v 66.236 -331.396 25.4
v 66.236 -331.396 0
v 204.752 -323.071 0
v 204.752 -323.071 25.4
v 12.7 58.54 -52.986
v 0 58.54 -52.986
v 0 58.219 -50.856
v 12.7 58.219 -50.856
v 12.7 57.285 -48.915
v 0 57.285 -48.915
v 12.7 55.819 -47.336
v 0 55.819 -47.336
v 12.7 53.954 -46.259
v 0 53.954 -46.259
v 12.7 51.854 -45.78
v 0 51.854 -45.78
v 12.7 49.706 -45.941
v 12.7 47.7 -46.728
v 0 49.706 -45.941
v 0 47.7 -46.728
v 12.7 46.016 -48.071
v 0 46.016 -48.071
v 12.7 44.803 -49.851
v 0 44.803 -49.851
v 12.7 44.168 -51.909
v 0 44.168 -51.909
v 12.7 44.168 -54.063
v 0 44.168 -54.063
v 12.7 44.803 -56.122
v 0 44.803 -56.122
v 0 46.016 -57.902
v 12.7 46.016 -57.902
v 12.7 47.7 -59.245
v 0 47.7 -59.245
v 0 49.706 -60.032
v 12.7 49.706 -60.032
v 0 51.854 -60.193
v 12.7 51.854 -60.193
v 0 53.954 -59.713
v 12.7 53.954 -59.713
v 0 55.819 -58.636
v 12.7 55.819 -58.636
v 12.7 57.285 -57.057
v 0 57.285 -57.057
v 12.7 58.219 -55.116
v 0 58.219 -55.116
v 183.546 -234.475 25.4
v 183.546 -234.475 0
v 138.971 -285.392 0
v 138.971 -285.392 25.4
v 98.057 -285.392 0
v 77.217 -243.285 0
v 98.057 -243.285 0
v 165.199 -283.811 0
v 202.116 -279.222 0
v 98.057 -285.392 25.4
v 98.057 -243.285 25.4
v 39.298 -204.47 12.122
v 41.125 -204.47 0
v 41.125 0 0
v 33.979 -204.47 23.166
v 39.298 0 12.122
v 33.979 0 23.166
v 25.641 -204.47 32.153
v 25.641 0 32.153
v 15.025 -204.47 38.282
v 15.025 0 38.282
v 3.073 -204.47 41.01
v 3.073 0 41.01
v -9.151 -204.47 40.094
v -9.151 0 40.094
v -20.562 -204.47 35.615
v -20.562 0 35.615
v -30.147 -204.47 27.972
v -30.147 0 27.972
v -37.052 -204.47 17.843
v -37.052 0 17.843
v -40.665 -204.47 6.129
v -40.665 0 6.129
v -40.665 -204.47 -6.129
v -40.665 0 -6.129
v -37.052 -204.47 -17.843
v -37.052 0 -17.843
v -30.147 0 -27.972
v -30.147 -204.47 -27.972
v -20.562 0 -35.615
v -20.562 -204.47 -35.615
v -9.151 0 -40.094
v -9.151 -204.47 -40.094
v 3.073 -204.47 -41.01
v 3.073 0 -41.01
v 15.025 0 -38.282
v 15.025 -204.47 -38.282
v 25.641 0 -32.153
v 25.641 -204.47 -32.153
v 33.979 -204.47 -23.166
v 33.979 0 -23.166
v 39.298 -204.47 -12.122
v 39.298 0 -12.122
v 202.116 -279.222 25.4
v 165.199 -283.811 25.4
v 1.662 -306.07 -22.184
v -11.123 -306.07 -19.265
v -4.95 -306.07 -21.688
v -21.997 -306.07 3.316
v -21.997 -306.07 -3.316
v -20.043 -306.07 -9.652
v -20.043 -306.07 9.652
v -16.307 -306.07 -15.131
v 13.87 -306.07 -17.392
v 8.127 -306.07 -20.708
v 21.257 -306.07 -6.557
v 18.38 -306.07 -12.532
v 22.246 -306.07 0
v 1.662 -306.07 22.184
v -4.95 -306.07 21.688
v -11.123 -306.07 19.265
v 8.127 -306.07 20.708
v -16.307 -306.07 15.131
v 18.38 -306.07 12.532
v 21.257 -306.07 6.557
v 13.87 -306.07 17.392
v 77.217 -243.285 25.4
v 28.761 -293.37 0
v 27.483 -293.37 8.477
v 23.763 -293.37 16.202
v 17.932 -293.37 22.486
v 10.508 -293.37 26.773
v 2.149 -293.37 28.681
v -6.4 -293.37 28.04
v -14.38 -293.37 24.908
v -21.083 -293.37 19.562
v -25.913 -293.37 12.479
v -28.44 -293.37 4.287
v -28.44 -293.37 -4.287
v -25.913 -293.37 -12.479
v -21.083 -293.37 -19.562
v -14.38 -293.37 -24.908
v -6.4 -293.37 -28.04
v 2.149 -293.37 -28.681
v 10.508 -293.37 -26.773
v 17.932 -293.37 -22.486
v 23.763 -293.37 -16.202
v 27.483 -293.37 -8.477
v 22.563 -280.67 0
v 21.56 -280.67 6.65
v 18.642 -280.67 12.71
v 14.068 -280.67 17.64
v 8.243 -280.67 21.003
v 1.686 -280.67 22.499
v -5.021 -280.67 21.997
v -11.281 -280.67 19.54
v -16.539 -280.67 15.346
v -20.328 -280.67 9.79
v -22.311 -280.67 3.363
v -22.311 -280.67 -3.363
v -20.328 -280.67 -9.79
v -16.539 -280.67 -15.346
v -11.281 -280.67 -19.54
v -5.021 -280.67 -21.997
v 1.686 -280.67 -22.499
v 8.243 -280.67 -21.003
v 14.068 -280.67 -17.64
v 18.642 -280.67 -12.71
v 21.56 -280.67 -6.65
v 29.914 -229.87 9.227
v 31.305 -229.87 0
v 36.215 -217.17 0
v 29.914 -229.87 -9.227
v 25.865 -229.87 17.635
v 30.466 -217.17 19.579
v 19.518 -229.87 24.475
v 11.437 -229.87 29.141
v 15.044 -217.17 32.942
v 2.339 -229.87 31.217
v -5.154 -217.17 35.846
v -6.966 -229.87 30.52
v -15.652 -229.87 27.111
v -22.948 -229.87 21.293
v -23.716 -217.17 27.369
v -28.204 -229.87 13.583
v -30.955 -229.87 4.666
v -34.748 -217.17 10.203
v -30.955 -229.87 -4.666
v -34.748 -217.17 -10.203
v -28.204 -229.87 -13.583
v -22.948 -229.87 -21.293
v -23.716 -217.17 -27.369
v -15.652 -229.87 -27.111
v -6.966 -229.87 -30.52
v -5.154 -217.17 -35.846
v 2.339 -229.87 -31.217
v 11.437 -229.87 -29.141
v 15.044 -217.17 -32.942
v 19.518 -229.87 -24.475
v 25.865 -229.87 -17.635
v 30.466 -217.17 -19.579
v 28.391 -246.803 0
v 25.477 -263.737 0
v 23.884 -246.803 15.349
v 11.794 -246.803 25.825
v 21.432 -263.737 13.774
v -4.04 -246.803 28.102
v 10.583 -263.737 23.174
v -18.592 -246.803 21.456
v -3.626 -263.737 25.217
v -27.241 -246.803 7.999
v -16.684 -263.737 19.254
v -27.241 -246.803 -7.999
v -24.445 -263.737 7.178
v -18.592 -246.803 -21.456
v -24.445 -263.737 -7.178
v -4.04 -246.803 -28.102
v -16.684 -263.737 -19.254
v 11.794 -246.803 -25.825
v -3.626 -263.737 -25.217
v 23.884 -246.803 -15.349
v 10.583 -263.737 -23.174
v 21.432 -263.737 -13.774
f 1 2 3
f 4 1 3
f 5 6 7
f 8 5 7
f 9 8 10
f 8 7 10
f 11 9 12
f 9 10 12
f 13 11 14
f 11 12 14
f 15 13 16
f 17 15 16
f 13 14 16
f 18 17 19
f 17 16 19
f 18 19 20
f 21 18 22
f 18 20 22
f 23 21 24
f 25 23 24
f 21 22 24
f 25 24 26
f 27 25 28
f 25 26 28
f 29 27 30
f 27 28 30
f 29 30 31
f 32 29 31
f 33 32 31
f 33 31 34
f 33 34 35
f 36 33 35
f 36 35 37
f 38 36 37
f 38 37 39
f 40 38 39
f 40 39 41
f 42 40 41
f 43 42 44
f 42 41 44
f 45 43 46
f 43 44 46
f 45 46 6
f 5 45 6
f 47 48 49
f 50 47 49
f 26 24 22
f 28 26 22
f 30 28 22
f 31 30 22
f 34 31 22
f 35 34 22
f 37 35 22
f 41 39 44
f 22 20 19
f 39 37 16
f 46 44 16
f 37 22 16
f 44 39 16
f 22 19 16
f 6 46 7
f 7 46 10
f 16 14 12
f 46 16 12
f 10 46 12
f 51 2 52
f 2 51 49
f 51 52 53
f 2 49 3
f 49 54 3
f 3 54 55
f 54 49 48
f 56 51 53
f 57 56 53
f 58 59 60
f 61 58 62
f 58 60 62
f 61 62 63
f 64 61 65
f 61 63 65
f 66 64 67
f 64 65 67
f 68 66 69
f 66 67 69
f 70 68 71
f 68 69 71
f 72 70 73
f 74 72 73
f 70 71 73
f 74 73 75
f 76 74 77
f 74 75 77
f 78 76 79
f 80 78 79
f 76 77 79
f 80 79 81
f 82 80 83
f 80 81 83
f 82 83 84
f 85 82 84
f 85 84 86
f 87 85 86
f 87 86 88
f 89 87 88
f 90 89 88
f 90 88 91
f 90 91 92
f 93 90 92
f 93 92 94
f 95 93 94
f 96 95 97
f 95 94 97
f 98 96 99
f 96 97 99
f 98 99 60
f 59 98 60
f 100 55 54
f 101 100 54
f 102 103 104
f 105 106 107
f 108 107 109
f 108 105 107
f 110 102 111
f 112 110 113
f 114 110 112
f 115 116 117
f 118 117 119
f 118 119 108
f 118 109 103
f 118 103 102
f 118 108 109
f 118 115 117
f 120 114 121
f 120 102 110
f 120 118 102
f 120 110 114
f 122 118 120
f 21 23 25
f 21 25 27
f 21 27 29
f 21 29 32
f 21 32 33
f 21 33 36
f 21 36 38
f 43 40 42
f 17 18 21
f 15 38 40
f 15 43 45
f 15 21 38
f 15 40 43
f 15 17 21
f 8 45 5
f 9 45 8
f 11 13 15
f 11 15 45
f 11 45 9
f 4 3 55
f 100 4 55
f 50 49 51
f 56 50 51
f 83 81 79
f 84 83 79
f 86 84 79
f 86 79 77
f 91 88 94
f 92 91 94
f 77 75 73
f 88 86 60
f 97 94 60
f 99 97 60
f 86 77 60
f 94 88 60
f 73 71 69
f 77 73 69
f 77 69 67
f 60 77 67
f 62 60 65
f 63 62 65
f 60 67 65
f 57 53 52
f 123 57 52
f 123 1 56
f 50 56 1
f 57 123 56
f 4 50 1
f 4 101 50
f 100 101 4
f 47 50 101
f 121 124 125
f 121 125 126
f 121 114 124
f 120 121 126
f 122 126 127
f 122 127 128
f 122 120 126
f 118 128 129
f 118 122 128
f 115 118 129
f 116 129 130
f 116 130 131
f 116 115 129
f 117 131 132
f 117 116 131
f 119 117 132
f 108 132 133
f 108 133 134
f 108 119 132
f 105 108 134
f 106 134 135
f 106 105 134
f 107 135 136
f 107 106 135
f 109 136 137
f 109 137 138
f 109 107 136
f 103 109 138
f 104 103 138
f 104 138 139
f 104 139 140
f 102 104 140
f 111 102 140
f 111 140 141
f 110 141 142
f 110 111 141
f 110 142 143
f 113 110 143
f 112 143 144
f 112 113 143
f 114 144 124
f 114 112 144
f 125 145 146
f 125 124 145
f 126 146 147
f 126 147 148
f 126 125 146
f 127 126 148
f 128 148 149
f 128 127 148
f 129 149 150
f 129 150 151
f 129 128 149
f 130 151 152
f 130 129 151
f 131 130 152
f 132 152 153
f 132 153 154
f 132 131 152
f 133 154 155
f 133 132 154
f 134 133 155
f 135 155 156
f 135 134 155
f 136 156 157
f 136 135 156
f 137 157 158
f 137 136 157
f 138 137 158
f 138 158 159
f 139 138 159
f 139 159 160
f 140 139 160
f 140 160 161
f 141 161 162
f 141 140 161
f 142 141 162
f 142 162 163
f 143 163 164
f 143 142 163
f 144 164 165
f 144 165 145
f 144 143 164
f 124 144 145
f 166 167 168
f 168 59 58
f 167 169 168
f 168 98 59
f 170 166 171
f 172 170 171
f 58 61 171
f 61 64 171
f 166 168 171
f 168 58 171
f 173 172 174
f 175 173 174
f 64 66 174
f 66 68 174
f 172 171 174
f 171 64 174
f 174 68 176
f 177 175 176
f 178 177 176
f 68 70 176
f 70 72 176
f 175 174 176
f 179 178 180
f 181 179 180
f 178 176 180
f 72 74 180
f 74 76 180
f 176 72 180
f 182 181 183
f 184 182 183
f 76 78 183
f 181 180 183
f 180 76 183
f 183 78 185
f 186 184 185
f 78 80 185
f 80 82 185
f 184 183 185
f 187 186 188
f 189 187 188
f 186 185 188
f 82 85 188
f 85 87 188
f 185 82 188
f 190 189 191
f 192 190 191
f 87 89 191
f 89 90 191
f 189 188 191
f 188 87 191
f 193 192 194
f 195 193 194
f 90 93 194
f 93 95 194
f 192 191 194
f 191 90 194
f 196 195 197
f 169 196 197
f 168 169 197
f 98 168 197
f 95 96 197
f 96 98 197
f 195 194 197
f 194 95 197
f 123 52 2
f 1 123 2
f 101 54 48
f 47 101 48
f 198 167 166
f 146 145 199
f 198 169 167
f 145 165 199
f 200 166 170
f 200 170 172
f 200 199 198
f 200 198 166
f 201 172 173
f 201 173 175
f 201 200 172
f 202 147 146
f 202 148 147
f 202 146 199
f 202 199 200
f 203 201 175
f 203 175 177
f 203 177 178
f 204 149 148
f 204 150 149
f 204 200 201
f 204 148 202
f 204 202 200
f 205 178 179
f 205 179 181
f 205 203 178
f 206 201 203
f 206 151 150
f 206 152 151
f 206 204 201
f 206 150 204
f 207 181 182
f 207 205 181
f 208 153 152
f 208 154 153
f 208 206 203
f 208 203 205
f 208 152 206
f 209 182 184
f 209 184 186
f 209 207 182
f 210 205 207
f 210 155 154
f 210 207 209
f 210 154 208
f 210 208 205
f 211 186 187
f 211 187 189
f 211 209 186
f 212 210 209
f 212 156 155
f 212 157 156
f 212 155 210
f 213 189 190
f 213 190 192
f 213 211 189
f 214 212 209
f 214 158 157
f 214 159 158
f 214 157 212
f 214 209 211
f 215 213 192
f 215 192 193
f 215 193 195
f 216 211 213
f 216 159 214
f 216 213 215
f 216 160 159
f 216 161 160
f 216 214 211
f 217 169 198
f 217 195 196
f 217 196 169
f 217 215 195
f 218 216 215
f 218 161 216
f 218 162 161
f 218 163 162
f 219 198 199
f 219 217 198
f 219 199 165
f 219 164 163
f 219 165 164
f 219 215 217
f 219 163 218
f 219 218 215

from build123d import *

# Parameters (mm, degrees)
F0_R       = 41.1246715707
F1_DEPTH   = 204.47
F4_R       = 31.304586073
F1_FACE_R  = 41.1246715707
F5_FACE_R  = 31.304586073
F6_R       = 22.562521852
F7_FACE_R  = 22.562521852
F10_R      = 28.7609261633
F12_FACE_R = 28.7609261633
F11_R      = 22.2458037408
F15_DEPTH  = 25.4
F16_R      = 7.2267187417
F17_DEPTH  = 12.7


with BuildPart() as f1:
    # F0 (on Front) → F1 (new body)
    with BuildSketch(Plane.XZ):
        Circle(F0_R)
    extrude(amount=F1_DEPTH)

    # F4 (on offset) → F5 section 0
    with BuildSketch(Plane.XZ.offset(229.87)):
        Circle(F4_R)
    # F1_face (on face) → F5 section 1
    with BuildSketch(Plane.XZ.offset(204.47)):
        Circle(F1_FACE_R)
    loft()

    # F5_face (on face) → F7 section 0
    with BuildSketch(Plane.XZ.offset(229.87)):
        Circle(F5_FACE_R)
    # F6 (on offset) → F7 section 1
    with BuildSketch(Plane.XZ.offset(280.67)):
        Circle(F6_R)
    loft()

    # F7_face (on face) → F12 section 0
    with BuildSketch(Plane.XZ.offset(280.67)):
        Circle(F7_FACE_R)
    # F10 (on offset) → F12 section 1
    with BuildSketch(Plane.XZ.offset(293.37)):
        Circle(F10_R)
    loft()

    # F12_face (on face) → F13 section 0
    with BuildSketch(Plane.XZ.offset(293.37)):
        Circle(F12_FACE_R)
    # F11 (on offset) → F13 section 1
    with BuildSketch(Plane.XZ.offset(306.07)):
        Circle(F11_R)
    loft()


with BuildPart() as f15:
    # F14 (on Top) → F15 (new body)
    with BuildSketch(Plane.XY):
        Polygon((202.1164744268, -279.2215311312), (165.1990115643, -283.8112711906), (183.5463047028, -234.4745099545), (138.9713287354, -285.3920757771), (98.0570316315, -285.3920757771), (98.0570316315, -243.2848960161), (77.2171244025, -243.2848960161), (66.2356987596, -331.3960134983), (204.7517895699, -323.0713903904), align=None)
    extrude(amount=F15_DEPTH)


with BuildPart() as f17:
    # F16 (on Right) → F17 (new body)
    with BuildSketch(Plane.YZ):
        with Locations((51.3137020171, -52.9861934483)):
            Circle(F16_R)
    extrude(amount=F17_DEPTH)


solid = Compound([f1.part, f15.part, f17.part])
